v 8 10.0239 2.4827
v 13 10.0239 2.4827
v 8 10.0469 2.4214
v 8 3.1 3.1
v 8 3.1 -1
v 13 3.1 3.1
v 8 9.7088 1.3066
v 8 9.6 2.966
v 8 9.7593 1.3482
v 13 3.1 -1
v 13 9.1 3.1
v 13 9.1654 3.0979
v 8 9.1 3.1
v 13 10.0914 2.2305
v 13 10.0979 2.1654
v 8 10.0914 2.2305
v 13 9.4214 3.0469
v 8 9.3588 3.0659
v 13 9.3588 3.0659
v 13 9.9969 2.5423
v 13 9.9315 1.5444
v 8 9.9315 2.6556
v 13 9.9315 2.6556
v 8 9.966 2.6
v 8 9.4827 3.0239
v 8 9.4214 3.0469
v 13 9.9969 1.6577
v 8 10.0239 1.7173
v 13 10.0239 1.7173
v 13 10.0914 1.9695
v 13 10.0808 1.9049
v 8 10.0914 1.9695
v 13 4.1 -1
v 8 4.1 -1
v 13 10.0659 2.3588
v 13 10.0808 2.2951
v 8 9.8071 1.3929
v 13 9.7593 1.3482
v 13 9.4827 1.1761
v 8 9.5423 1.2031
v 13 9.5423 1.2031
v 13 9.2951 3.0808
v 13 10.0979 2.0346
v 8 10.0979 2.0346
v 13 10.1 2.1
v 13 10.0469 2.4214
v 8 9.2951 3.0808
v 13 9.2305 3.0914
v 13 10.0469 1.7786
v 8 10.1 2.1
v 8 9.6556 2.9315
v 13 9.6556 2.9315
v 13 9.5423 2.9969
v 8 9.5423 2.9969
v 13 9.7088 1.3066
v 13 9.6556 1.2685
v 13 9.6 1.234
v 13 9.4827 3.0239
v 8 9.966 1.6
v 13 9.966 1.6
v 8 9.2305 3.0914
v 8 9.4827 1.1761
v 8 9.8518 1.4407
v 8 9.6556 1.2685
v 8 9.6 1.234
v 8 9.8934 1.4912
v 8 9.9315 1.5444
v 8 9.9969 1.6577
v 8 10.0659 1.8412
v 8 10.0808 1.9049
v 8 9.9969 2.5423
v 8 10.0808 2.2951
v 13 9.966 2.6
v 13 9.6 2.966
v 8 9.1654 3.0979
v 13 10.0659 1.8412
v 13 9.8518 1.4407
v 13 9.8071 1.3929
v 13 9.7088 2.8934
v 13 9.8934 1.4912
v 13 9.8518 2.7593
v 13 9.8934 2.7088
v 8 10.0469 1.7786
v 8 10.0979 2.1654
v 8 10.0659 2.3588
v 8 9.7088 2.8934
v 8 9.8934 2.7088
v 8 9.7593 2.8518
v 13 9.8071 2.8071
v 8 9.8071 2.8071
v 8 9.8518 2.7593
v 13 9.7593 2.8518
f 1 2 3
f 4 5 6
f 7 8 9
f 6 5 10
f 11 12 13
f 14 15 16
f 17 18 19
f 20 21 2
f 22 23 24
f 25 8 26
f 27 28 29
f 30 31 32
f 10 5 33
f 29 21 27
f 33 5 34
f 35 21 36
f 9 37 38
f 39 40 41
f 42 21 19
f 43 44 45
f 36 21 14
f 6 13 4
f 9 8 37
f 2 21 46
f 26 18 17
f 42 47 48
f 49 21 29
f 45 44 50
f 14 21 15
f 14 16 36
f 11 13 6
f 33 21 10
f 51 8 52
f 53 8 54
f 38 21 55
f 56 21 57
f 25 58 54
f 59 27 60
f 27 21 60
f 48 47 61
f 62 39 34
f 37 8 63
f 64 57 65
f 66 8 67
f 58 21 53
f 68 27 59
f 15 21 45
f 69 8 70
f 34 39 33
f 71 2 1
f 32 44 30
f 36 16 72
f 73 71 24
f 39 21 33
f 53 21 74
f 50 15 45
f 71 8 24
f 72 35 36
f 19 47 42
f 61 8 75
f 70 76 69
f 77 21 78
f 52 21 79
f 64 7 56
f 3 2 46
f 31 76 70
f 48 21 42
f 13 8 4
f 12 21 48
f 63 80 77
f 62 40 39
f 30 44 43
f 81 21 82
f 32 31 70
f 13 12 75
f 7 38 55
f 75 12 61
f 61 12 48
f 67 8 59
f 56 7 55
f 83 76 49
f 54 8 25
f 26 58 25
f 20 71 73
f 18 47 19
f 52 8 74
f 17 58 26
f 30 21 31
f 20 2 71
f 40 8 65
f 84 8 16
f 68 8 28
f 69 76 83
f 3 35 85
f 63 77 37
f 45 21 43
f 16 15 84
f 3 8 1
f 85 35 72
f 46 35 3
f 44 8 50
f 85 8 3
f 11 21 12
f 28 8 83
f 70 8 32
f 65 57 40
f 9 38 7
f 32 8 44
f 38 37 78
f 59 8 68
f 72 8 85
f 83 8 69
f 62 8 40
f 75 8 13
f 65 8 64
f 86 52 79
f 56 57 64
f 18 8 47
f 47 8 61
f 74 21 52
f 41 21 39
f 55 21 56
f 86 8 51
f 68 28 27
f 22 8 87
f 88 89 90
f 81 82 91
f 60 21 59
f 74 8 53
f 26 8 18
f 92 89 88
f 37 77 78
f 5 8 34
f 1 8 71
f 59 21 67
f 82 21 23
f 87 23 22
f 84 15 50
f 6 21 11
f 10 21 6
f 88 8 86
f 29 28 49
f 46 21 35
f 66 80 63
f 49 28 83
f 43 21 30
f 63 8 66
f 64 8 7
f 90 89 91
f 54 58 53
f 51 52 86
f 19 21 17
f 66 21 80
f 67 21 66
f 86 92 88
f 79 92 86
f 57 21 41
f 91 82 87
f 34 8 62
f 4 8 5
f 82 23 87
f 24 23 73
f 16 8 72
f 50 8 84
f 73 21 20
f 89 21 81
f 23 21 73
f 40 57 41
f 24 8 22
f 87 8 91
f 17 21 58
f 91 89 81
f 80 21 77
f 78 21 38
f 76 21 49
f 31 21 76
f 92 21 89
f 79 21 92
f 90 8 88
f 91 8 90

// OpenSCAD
// a cylinder lying along X beside a block of the same length (thing 3143289): the prism tier on
// its side, where the Gauss plan lost a ruling.
$fn = 96;
hull() {
  translate([8, 9.1, 2.1]) rotate([0, 90, 0]) cylinder(r = 1, h = 5);
  translate([8, 3.1, -1]) cube([5, 1, 4.1]);
}
